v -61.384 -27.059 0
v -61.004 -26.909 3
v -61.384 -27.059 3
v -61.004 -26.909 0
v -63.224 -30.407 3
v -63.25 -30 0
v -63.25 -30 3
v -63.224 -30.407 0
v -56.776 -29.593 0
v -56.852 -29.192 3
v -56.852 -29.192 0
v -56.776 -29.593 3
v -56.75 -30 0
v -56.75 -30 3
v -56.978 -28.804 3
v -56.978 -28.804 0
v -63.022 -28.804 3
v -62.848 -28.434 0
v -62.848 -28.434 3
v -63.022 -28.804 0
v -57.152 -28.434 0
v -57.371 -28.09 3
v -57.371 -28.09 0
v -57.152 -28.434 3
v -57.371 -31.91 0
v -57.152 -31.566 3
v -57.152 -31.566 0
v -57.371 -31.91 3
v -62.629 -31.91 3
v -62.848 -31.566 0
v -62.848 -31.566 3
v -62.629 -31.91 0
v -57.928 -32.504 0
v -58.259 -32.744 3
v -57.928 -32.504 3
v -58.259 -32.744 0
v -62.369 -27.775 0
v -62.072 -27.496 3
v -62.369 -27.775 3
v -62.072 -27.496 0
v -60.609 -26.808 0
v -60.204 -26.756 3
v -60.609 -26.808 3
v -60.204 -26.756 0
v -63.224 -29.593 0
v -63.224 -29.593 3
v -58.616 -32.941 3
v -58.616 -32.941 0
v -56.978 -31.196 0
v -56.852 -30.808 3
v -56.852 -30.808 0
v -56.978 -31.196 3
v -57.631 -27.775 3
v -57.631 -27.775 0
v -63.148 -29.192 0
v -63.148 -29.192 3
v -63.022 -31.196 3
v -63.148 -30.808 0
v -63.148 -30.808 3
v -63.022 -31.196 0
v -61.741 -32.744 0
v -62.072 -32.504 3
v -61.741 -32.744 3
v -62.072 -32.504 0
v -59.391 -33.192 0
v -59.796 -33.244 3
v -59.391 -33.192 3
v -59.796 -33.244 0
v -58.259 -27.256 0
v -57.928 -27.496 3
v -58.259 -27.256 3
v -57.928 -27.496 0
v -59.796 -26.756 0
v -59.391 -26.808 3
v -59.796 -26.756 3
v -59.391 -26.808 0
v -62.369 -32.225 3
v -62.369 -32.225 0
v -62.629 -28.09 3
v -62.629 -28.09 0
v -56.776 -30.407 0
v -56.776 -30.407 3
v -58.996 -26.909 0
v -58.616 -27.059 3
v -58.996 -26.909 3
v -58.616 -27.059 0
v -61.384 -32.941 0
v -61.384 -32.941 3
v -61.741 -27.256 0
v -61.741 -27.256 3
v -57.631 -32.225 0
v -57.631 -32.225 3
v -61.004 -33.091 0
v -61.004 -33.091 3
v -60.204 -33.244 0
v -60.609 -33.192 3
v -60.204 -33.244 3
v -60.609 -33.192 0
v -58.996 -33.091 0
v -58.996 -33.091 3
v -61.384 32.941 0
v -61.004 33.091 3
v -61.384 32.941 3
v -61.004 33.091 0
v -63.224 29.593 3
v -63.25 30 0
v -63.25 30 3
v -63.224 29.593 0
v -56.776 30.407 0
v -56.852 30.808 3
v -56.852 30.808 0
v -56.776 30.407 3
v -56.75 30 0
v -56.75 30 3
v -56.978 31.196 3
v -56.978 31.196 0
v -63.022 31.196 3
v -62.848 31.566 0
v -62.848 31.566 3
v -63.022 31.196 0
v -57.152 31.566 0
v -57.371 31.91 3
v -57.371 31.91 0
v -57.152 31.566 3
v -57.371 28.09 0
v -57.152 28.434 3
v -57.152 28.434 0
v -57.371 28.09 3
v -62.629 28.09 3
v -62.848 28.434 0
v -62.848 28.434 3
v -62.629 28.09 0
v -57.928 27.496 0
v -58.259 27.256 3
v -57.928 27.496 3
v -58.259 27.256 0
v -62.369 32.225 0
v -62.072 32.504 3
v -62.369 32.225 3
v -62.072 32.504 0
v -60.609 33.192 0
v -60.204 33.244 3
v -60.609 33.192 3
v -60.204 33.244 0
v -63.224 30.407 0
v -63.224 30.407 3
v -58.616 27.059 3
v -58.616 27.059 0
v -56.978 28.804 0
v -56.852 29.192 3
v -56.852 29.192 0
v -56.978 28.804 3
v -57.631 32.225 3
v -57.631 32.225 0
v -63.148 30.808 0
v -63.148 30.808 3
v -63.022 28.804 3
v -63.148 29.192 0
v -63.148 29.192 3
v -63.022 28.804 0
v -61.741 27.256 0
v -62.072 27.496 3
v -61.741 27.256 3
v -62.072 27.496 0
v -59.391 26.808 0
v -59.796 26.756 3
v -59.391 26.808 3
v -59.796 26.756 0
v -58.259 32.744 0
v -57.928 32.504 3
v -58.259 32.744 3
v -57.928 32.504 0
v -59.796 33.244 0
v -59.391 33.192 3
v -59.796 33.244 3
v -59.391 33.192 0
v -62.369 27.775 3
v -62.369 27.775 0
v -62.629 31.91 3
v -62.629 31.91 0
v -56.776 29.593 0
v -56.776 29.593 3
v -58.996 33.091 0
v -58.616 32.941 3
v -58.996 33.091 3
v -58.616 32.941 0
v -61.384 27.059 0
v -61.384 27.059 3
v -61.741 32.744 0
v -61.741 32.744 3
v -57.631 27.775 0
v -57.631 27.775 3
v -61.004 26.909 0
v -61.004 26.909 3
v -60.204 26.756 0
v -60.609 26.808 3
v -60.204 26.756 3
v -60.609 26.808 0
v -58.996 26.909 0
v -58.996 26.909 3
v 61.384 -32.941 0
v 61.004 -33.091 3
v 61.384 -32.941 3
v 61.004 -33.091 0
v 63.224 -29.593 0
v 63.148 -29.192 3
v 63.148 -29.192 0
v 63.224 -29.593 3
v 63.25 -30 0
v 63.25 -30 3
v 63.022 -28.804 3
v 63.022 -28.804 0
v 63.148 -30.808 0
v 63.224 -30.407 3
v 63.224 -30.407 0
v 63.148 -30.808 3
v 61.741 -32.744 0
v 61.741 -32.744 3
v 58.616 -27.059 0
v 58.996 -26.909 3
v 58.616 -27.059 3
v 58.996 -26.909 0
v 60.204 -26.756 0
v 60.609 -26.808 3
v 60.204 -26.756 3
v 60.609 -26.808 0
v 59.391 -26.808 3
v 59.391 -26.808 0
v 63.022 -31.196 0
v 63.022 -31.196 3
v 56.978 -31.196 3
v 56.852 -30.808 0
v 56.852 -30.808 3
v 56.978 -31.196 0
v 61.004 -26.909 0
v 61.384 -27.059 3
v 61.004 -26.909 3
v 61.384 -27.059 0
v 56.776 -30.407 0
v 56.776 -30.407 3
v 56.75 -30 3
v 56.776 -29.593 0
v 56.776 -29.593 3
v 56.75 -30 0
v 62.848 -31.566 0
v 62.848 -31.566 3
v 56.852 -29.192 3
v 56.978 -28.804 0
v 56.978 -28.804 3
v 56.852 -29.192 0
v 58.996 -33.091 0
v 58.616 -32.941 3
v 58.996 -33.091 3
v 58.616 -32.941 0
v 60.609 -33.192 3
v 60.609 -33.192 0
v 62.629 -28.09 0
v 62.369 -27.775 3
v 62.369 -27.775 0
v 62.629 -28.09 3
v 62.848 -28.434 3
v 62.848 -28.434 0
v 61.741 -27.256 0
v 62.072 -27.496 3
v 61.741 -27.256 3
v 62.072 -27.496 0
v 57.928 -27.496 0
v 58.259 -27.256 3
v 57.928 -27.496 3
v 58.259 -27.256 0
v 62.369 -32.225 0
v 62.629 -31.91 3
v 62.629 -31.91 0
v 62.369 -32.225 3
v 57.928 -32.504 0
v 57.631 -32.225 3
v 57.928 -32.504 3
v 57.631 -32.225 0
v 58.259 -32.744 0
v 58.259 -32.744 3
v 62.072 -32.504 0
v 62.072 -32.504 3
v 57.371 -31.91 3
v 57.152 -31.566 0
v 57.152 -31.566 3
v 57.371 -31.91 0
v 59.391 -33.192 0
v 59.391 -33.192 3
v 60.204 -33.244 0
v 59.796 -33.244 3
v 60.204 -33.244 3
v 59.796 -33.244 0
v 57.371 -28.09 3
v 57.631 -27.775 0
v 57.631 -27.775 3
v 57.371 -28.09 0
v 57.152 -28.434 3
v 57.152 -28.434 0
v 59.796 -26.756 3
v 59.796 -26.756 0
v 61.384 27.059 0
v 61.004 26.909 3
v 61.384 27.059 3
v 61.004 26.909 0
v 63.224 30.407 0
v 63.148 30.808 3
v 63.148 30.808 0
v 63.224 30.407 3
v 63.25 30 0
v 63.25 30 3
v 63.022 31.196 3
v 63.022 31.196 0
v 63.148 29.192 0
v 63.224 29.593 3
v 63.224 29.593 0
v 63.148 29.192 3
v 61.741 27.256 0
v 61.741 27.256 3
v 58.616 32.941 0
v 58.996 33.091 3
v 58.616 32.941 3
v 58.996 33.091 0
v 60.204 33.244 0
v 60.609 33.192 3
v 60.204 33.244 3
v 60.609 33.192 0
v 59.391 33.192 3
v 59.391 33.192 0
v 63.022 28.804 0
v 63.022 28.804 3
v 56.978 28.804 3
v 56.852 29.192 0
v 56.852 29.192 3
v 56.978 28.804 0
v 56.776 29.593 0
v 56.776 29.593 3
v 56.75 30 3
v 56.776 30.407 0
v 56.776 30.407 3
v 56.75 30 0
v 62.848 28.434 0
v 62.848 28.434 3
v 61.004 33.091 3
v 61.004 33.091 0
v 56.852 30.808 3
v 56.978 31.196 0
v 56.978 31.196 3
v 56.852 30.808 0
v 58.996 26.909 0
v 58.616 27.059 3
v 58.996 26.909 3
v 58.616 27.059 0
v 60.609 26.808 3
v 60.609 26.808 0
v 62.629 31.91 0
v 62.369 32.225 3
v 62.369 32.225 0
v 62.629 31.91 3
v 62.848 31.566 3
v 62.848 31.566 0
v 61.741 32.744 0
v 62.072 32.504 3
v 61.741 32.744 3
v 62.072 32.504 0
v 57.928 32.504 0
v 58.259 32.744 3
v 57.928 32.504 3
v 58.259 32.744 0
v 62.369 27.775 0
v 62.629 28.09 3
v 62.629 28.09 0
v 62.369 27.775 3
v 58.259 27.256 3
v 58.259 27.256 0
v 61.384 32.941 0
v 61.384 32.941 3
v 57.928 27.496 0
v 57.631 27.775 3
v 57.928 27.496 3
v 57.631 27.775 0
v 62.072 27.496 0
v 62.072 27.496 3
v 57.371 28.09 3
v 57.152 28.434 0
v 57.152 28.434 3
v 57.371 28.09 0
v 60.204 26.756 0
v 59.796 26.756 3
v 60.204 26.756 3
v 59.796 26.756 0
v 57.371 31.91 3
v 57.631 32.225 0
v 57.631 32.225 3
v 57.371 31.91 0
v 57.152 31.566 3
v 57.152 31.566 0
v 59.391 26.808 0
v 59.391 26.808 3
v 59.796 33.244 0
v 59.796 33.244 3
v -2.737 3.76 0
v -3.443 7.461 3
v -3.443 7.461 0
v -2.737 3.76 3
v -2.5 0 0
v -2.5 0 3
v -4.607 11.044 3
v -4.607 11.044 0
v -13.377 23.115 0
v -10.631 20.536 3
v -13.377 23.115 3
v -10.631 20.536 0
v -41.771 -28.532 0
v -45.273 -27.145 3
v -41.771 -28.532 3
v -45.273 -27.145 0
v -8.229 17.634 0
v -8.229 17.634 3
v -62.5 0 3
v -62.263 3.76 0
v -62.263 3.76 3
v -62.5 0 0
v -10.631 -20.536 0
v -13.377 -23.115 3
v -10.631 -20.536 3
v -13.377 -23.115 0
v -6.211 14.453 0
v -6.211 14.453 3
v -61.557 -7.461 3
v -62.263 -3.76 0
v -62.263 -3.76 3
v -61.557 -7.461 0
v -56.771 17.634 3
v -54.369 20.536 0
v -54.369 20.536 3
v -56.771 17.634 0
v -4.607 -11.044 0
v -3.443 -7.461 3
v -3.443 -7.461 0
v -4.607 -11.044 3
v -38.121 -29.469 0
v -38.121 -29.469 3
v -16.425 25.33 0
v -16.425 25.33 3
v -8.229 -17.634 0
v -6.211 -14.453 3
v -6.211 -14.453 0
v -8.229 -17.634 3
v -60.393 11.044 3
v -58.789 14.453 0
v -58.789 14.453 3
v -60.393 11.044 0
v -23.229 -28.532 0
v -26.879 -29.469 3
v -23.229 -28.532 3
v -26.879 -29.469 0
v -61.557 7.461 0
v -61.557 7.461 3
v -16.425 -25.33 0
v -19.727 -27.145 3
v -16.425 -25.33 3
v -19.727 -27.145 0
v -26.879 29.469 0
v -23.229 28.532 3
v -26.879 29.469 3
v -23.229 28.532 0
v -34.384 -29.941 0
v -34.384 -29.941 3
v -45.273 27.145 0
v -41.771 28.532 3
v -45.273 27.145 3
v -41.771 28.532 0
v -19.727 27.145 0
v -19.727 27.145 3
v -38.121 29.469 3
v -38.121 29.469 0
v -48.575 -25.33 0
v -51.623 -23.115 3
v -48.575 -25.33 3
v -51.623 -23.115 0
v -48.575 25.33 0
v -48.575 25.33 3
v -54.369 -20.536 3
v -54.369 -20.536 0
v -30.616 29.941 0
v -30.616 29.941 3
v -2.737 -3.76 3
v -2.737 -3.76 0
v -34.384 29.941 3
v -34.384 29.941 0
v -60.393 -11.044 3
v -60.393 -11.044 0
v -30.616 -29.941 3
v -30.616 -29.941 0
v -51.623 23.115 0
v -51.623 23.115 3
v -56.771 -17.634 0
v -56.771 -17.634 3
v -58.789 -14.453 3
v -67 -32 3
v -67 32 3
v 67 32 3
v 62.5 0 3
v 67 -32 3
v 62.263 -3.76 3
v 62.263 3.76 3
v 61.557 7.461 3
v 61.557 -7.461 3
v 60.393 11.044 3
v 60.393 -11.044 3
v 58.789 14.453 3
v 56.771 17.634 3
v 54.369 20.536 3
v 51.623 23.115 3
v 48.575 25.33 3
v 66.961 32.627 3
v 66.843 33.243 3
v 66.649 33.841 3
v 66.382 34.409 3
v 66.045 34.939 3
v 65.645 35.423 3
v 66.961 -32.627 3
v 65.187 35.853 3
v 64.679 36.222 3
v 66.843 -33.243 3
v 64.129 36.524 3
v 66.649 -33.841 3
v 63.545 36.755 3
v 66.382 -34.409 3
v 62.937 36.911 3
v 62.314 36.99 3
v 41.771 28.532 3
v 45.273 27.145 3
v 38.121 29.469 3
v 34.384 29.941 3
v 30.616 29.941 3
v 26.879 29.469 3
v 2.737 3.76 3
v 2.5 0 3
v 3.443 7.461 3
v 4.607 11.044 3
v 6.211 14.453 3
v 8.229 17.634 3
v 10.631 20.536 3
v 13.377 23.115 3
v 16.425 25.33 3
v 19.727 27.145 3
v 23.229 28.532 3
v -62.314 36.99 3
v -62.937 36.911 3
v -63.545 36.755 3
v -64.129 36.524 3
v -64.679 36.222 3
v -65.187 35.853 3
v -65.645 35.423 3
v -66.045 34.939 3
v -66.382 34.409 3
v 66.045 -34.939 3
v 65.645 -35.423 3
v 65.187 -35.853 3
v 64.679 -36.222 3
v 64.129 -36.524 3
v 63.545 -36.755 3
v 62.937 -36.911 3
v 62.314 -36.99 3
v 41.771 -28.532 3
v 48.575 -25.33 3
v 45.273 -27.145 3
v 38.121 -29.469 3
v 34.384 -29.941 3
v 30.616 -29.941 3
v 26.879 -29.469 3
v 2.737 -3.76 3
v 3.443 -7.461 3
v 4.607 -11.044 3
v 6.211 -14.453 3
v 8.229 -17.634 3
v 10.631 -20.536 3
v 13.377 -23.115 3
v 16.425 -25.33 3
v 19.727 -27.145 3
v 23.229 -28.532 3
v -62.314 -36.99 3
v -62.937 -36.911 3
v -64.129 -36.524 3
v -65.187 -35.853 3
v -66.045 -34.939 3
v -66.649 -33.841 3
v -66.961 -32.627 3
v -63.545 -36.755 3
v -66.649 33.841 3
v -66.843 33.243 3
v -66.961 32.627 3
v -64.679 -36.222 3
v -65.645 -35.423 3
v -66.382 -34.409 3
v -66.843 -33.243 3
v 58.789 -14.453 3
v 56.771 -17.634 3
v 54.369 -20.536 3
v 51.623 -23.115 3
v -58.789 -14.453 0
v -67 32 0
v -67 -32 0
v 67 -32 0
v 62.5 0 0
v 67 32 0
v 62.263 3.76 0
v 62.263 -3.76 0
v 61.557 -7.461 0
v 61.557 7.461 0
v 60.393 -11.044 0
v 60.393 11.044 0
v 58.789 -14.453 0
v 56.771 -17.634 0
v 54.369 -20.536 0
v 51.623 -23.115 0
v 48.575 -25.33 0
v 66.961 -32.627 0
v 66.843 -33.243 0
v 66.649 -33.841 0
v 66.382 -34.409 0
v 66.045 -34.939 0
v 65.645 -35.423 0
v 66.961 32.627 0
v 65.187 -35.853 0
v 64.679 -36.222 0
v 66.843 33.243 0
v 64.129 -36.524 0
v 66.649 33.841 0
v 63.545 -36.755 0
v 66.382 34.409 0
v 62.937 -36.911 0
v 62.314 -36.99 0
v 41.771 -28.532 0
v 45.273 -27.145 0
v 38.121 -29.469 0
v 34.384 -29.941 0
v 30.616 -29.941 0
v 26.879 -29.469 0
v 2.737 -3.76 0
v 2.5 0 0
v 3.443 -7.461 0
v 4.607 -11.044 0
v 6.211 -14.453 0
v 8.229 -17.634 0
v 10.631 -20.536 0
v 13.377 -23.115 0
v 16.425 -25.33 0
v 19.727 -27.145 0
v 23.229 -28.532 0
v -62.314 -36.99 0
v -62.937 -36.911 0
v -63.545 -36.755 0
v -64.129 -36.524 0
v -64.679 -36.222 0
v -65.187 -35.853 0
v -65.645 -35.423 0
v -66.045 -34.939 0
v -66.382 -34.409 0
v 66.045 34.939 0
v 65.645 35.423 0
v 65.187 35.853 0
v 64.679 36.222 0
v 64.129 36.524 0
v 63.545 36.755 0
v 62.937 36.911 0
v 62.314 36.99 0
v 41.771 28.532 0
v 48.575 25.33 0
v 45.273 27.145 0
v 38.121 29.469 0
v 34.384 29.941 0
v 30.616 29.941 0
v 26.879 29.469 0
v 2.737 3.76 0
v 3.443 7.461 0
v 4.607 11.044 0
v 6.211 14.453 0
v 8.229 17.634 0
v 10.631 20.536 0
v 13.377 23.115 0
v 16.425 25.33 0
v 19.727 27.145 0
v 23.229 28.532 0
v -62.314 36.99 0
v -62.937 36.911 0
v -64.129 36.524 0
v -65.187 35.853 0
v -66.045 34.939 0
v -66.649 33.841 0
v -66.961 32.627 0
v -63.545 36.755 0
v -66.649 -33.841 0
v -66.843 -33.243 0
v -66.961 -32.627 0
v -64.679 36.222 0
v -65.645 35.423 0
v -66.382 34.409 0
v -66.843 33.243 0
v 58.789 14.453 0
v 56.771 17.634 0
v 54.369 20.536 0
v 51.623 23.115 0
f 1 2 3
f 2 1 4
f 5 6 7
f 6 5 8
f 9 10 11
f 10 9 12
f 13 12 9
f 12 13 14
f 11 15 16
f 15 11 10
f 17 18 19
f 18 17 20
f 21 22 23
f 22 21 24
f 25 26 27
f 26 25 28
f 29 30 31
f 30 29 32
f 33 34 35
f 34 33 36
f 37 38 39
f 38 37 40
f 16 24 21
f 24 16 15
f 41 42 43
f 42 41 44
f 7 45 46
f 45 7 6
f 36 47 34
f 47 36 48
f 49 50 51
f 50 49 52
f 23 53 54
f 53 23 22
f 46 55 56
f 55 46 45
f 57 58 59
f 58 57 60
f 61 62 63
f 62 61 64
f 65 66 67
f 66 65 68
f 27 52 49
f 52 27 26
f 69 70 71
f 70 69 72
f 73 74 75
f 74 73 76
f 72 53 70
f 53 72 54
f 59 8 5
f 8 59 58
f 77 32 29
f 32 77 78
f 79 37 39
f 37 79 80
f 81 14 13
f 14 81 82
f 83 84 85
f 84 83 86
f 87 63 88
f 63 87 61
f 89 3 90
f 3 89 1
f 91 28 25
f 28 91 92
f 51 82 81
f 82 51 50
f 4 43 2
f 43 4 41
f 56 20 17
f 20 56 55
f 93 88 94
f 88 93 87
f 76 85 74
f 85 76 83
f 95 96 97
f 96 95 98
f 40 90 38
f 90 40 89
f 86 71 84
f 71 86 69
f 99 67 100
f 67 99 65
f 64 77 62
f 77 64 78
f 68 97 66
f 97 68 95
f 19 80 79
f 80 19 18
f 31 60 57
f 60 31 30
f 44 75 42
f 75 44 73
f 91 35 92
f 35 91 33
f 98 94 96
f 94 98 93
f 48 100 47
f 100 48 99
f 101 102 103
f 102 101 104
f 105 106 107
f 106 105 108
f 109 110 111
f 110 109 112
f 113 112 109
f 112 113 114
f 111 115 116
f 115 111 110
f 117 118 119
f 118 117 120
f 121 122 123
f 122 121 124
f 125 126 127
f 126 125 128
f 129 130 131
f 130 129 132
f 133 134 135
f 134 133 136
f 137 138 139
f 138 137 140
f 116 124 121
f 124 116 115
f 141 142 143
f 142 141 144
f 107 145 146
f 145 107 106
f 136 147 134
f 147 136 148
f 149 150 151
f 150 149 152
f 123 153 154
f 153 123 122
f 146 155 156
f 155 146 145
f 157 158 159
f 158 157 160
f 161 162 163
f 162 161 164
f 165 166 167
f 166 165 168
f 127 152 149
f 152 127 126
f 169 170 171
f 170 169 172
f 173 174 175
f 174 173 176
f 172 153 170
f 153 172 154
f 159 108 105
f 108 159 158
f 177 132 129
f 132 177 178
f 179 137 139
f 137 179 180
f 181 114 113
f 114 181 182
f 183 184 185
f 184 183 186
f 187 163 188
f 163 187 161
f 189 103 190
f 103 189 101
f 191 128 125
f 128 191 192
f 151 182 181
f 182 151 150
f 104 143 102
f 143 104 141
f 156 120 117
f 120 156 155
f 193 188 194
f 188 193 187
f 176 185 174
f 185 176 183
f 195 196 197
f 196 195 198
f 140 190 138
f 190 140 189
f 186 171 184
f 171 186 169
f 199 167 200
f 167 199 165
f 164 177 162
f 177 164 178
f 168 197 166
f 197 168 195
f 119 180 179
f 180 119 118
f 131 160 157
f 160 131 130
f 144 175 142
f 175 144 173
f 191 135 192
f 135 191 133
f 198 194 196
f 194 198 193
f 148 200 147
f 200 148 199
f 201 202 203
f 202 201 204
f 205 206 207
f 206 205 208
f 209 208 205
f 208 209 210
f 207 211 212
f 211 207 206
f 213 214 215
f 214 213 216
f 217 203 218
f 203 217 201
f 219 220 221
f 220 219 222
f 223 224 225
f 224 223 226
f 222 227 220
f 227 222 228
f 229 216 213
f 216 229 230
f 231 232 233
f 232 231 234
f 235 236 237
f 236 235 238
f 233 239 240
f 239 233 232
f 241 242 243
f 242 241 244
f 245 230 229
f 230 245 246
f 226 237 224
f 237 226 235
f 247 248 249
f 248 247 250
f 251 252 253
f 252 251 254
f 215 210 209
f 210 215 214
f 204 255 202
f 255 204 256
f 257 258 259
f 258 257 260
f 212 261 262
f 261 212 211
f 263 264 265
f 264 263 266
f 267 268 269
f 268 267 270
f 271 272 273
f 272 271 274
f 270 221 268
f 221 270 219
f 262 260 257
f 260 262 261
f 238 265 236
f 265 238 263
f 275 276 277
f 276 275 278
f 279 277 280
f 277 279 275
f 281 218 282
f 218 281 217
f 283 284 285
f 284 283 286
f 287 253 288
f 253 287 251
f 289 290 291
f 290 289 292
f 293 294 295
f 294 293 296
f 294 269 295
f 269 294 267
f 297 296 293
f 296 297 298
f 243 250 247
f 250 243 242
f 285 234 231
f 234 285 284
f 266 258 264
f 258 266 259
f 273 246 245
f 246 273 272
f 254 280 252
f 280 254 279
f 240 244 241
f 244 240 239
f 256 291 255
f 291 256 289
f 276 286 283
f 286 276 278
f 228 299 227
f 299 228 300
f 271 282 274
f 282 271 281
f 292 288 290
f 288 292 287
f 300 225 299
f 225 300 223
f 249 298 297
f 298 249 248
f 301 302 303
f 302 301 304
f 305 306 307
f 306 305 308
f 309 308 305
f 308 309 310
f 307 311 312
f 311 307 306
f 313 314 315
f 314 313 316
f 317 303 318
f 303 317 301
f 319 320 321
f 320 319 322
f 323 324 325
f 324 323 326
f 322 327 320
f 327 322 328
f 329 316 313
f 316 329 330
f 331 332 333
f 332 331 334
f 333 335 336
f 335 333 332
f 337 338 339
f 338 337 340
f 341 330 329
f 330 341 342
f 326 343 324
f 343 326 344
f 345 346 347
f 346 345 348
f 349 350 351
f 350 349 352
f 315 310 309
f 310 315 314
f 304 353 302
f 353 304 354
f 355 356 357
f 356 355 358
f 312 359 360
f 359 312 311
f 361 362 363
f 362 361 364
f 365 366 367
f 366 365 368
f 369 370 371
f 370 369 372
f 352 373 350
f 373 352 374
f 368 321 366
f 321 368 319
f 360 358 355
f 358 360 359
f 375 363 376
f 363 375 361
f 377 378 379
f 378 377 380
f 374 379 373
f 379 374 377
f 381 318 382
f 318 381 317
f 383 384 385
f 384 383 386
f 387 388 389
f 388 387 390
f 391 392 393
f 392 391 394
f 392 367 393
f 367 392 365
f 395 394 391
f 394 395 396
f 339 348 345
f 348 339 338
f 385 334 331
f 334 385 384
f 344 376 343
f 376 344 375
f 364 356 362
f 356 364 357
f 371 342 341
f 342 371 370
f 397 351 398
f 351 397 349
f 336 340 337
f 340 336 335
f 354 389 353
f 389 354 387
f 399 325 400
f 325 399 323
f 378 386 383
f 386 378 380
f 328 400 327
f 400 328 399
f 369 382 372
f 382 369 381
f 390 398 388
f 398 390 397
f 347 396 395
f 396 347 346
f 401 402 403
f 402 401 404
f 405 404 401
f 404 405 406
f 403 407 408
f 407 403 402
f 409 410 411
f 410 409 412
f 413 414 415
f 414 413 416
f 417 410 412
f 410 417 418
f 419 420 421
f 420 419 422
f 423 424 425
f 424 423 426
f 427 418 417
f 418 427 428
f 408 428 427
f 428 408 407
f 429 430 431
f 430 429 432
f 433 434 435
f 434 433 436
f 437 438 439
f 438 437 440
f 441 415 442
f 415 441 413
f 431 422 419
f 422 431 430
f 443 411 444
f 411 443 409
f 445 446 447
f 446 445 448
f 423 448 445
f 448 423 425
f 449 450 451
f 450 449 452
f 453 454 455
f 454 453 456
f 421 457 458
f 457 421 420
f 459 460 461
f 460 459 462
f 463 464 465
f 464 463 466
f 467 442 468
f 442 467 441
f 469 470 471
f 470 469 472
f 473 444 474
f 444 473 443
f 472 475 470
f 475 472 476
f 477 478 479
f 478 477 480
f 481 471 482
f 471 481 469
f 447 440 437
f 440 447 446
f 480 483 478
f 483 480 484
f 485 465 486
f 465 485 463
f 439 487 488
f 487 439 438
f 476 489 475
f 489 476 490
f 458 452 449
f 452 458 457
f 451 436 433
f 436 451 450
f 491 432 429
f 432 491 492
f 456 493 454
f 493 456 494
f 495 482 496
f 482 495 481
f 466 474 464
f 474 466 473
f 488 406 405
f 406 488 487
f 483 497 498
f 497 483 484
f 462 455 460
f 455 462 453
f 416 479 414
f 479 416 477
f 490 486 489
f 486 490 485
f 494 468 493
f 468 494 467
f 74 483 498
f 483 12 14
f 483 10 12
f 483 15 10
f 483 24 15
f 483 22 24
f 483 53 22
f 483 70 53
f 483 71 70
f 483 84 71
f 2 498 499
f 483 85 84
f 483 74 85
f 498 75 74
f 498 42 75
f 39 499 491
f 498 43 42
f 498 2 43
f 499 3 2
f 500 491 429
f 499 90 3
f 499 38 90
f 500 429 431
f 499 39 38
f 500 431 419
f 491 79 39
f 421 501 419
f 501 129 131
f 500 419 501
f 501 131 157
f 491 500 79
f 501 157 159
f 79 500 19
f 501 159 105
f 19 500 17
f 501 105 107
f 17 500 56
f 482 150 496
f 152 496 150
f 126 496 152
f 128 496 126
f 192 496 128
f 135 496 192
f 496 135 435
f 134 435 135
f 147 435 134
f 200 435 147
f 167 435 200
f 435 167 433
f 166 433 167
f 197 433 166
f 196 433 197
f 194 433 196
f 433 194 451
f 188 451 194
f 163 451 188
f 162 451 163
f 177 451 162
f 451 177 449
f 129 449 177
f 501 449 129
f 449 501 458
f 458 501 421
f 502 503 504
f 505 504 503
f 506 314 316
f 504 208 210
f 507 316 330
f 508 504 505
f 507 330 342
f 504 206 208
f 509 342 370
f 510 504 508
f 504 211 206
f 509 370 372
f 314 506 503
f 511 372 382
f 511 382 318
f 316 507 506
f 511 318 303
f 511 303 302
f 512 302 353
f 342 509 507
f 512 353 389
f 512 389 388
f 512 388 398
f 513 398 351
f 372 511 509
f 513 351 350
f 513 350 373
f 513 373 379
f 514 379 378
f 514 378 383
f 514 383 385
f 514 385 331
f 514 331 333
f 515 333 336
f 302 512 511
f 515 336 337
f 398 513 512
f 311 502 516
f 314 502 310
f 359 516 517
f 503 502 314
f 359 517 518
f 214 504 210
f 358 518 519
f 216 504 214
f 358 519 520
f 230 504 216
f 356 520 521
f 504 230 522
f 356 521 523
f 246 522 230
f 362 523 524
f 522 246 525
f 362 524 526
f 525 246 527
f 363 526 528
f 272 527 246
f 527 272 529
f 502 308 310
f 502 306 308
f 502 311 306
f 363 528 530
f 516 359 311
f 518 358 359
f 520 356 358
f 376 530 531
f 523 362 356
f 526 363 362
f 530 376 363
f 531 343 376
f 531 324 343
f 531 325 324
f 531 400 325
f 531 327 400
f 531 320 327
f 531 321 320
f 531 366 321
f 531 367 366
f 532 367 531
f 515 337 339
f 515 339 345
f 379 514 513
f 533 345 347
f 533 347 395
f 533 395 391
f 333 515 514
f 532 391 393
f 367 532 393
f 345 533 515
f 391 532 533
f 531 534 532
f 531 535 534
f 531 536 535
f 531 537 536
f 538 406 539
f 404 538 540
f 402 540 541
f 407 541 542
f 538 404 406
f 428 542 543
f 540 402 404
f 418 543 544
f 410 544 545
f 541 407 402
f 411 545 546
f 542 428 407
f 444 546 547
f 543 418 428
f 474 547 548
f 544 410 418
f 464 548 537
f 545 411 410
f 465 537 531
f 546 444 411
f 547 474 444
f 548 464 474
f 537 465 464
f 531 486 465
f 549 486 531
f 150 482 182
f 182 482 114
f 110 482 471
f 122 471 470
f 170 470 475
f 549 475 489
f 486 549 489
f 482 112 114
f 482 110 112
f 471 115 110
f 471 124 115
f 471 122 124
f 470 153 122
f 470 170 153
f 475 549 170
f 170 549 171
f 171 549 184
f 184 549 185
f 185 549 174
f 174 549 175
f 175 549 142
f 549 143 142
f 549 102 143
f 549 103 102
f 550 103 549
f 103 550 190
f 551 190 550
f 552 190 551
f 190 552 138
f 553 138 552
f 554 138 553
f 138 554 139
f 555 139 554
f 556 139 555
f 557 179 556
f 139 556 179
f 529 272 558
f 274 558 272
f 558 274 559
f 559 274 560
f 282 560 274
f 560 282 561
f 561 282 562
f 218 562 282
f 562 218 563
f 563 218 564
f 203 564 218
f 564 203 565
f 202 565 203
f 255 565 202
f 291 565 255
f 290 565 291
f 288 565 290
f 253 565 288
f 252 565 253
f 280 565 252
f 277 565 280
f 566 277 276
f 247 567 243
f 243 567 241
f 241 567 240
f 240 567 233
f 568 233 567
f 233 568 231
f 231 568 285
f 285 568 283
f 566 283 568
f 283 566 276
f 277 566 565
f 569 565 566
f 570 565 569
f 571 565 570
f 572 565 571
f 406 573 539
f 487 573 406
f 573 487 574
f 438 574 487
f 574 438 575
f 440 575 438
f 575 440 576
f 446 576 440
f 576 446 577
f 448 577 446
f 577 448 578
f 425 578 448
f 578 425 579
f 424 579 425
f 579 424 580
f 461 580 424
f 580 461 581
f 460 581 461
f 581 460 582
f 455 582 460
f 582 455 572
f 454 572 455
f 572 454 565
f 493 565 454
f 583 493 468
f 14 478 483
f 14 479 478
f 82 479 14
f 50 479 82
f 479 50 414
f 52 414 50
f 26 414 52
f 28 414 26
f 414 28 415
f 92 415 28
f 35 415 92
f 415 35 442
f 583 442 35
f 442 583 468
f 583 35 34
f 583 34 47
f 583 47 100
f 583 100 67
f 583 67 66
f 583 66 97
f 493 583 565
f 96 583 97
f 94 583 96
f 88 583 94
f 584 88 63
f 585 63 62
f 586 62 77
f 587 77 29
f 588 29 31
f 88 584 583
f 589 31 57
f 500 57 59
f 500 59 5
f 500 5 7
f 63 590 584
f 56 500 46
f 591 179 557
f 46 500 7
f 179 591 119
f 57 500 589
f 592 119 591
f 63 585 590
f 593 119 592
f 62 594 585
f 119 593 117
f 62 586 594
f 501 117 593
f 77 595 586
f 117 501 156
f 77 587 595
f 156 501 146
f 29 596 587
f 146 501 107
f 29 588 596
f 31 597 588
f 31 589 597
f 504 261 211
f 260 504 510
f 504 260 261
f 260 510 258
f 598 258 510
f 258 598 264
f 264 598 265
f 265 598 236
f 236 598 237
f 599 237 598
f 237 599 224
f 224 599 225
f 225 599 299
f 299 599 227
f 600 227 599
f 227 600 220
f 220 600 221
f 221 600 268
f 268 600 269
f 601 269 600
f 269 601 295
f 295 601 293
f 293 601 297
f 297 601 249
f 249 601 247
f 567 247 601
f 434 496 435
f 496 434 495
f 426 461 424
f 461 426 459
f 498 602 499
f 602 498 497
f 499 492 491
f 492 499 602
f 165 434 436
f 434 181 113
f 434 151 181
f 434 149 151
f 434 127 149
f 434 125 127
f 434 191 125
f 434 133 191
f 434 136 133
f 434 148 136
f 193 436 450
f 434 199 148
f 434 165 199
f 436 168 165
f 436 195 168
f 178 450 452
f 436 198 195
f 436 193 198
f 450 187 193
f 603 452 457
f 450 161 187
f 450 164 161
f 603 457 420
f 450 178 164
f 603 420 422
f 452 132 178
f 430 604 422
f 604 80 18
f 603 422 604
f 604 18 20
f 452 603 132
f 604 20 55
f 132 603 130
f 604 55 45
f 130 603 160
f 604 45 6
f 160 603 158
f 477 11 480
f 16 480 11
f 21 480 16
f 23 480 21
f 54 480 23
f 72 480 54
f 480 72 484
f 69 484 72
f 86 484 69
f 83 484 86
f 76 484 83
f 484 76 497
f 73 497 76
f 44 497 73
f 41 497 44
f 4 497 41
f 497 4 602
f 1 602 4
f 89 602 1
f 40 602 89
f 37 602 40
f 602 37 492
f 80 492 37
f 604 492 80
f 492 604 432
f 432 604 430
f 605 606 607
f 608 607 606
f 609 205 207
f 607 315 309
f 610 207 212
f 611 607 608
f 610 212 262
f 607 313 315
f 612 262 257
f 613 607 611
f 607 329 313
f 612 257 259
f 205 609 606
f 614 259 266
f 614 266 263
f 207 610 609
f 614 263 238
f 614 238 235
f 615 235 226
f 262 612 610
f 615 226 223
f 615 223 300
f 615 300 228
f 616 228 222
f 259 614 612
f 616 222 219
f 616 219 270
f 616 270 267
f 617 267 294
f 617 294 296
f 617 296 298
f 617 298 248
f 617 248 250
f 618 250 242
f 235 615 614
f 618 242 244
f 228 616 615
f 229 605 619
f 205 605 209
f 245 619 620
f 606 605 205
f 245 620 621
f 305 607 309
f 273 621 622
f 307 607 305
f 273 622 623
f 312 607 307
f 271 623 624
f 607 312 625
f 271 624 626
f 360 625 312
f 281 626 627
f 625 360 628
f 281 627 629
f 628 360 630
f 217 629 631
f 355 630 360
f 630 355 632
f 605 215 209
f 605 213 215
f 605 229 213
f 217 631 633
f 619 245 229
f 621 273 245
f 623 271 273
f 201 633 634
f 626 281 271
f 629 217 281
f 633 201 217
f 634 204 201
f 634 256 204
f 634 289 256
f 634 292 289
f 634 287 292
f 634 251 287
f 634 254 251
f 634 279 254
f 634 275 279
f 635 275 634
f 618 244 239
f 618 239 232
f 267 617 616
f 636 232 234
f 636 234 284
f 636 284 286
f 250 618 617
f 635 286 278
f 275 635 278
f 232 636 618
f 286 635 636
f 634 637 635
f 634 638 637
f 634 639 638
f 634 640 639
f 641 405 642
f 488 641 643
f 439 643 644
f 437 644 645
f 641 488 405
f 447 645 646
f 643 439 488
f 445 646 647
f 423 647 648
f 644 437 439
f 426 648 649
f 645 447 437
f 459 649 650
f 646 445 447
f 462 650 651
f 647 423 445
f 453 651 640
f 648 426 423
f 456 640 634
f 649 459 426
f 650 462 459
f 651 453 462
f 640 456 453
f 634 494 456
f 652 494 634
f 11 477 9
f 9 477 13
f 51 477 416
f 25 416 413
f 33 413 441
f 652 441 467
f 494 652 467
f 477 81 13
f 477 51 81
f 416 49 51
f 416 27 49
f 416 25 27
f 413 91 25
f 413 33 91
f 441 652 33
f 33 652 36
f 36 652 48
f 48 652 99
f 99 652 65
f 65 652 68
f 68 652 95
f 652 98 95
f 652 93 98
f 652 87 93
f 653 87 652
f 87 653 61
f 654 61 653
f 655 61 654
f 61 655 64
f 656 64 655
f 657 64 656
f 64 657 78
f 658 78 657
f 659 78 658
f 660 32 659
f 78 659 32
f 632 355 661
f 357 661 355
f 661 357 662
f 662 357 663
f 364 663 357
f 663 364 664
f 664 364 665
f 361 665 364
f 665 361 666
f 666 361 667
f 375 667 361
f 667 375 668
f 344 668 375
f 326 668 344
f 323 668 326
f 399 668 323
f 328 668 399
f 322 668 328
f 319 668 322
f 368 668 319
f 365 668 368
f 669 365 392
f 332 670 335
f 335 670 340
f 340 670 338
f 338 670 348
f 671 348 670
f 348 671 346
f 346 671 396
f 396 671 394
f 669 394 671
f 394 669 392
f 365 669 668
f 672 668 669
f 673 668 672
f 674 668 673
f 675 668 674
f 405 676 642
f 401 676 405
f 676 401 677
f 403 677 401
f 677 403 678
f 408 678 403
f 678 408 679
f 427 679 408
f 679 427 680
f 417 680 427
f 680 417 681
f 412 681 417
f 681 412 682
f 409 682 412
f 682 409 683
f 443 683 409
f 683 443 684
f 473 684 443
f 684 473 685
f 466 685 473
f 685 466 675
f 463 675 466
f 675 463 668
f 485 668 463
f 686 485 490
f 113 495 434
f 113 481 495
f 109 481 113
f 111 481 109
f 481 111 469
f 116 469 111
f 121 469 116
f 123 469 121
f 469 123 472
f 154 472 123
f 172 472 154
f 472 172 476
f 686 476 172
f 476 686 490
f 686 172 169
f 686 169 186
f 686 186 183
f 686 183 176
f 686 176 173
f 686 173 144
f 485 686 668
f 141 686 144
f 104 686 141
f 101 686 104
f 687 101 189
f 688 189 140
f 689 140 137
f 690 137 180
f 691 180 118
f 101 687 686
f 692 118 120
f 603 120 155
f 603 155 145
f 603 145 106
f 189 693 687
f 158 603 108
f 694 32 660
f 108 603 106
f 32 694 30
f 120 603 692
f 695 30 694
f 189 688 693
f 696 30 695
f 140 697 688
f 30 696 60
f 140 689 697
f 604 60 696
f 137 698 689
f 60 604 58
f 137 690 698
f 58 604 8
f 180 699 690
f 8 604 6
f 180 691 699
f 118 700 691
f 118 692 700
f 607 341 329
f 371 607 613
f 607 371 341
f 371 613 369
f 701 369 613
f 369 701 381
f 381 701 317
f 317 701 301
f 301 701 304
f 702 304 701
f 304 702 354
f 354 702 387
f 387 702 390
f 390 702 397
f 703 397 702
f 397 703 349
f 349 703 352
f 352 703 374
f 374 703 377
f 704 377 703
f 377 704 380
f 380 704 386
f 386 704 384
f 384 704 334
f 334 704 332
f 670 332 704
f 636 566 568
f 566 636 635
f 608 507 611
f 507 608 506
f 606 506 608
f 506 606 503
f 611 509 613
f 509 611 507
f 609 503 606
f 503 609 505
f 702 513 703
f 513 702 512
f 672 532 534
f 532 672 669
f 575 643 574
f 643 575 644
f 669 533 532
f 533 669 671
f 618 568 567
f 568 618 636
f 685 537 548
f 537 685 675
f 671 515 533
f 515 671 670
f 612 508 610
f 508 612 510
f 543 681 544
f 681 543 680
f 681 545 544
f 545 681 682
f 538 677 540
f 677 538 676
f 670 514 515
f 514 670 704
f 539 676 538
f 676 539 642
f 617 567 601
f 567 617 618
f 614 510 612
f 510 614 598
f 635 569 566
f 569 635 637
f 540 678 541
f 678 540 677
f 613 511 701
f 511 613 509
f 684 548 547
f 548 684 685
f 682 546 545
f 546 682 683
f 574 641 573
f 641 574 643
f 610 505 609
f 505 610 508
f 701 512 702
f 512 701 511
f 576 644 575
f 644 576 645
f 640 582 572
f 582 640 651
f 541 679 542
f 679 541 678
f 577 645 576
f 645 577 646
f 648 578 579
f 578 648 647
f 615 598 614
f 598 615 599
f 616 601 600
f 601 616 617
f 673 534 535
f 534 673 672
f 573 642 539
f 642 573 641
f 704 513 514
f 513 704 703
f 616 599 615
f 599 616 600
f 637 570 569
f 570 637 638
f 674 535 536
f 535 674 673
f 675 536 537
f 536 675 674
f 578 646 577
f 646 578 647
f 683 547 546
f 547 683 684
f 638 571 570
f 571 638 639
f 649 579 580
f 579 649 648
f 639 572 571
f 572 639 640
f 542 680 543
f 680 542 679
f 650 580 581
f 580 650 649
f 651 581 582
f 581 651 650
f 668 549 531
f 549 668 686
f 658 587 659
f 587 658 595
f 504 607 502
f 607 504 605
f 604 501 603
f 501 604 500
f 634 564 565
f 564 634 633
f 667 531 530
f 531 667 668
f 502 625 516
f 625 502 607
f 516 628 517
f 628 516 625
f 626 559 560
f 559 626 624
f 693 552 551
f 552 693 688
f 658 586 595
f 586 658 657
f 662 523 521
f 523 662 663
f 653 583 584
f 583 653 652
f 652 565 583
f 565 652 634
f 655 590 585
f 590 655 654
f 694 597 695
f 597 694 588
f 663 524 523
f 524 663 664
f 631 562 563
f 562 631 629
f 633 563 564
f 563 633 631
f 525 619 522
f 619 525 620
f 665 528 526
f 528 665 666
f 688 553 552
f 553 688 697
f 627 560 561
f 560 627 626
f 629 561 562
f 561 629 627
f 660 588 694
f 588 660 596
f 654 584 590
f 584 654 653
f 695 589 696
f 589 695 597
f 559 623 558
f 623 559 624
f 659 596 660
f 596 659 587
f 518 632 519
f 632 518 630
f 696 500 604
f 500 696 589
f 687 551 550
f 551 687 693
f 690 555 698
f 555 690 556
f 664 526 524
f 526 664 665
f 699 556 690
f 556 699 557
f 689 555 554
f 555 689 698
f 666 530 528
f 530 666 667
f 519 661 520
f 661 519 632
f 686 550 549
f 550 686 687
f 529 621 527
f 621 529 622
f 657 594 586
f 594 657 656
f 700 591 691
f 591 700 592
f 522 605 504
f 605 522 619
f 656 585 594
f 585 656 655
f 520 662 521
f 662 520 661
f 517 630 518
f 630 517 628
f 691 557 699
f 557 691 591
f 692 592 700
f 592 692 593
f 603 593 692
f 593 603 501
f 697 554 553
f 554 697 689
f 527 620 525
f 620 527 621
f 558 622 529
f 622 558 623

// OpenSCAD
$fn = 50;


difference() {
	union() {
		hull() {
			translate(v = [-62.0000000000, 32.0000000000, 0]) {
				cylinder(h = 3, r = 5);
			}
			translate(v = [62.0000000000, 32.0000000000, 0]) {
				cylinder(h = 3, r = 5);
			}
			translate(v = [-62.0000000000, -32.0000000000, 0]) {
				cylinder(h = 3, r = 5);
			}
			translate(v = [62.0000000000, -32.0000000000, 0]) {
				cylinder(h = 3, r = 5);
			}
		}
	}
	union() {
		#translate(v = [-60.0000000000, -30.0000000000, -100.0000000000]) {
			cylinder(h = 200, r = 3.2500000000);
		}
		#translate(v = [-60.0000000000, 30.0000000000, -100.0000000000]) {
			cylinder(h = 200, r = 3.2500000000);
		}
		#translate(v = [60.0000000000, -30.0000000000, -100.0000000000]) {
			cylinder(h = 200, r = 3.2500000000);
		}
		#translate(v = [60.0000000000, 30.0000000000, -100.0000000000]) {
			cylinder(h = 200, r = 3.2500000000);
		}
		#translate(v = [-32.5000000000, 0, 0]) {
			cylinder(h = 3, r = 30.0000000000);
		}
		#translate(v = [32.5000000000, 0, 0]) {
			cylinder(h = 3, r = 30.0000000000);
		}
	}
}
